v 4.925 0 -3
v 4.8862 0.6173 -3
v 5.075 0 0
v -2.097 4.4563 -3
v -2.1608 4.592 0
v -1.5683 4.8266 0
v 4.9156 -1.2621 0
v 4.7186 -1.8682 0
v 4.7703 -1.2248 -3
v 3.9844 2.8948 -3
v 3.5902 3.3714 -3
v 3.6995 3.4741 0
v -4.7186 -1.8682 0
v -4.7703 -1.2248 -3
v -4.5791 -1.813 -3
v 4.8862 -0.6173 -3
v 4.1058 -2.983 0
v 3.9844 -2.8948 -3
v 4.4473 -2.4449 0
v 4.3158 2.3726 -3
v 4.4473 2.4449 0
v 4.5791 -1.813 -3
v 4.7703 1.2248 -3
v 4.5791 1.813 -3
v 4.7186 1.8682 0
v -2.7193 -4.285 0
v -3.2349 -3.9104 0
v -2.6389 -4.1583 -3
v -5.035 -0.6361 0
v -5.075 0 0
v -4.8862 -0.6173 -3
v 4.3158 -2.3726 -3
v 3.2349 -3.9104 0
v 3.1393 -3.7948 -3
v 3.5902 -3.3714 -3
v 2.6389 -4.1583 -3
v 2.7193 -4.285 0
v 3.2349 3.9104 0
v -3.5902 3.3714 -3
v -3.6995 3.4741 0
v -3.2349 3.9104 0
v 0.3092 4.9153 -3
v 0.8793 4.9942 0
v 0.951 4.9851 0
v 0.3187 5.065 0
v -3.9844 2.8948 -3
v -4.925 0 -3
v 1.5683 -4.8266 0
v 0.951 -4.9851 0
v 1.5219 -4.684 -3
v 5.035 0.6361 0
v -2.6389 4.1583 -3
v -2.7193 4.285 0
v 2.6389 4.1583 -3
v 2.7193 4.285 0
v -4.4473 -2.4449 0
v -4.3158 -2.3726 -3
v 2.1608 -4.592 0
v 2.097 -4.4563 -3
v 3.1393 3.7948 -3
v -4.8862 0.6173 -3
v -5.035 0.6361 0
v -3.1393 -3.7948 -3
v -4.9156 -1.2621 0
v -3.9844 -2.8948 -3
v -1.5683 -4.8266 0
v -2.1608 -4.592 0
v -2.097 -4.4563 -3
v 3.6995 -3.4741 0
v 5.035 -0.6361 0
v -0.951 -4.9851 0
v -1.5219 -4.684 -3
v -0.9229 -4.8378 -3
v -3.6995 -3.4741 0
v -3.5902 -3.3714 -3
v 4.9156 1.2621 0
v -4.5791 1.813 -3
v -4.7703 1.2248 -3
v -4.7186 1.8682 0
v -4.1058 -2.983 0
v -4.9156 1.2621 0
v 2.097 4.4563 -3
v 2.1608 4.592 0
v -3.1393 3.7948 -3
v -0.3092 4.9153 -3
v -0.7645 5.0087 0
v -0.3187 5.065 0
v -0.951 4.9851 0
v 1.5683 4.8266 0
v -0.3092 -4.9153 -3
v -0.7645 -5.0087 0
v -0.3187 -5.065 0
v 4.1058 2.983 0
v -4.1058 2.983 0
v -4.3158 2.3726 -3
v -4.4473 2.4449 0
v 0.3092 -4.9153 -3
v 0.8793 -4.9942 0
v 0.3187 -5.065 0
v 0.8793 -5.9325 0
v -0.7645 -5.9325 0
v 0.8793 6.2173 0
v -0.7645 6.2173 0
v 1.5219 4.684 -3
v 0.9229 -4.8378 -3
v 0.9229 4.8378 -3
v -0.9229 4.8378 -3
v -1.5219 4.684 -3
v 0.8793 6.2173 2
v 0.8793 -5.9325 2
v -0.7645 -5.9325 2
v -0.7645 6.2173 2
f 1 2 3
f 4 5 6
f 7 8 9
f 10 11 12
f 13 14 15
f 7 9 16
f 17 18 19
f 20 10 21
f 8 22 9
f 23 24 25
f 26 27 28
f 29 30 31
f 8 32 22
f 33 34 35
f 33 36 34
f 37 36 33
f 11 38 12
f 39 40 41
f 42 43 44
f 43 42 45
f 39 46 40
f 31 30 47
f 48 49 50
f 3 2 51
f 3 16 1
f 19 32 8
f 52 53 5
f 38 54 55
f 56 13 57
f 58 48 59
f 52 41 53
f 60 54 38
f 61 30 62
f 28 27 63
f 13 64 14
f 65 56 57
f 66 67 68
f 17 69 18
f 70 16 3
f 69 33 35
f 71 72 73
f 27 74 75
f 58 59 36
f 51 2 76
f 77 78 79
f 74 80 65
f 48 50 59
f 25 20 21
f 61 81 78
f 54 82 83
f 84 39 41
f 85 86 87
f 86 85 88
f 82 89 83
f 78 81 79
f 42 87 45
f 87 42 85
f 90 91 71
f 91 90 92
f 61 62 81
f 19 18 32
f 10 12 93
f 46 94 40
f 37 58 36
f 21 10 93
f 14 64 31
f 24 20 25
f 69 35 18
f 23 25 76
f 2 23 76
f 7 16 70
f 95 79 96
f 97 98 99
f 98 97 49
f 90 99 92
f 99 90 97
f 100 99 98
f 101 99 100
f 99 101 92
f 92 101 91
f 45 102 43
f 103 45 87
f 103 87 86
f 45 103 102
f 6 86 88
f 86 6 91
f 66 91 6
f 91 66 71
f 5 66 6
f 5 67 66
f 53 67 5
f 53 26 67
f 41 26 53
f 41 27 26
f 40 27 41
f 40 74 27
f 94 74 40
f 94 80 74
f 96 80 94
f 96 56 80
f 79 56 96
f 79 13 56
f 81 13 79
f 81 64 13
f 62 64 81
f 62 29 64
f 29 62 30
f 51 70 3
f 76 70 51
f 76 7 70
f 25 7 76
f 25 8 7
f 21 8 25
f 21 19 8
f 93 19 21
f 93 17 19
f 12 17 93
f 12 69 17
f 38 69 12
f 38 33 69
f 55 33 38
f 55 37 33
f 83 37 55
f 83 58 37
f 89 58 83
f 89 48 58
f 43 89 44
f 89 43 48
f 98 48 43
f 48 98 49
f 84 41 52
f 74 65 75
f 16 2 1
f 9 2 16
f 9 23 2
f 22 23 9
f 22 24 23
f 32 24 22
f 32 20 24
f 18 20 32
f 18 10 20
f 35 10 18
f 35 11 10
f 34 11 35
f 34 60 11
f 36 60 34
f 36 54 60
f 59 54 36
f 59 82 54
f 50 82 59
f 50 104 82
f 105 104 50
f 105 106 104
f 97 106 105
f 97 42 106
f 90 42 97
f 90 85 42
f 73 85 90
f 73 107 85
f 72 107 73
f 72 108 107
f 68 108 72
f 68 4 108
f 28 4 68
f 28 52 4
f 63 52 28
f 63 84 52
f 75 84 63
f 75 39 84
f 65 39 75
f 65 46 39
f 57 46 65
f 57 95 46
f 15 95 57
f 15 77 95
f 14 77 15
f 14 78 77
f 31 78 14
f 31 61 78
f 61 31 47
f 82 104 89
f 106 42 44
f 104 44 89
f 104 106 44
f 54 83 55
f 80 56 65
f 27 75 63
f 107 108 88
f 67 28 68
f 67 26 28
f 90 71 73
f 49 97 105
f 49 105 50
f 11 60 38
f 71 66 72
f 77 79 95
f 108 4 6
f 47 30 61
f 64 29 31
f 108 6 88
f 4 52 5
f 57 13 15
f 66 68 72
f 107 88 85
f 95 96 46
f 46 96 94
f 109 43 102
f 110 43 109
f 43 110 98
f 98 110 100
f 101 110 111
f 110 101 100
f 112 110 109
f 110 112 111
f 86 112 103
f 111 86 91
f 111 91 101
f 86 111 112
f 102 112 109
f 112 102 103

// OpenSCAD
$fn = 50;


difference() {
	union() {
		translate(v = [0, 0, -3.0000000000]) {
			cylinder(h = 3, r1 = 4.9250000000, r2 = 5.0750000000);
		}
		linear_extrude(height = 2) {
			text(font = "Impact", halign = "center", size = 12, text = "I", valign = "center");
		}
	}
	union();
}
